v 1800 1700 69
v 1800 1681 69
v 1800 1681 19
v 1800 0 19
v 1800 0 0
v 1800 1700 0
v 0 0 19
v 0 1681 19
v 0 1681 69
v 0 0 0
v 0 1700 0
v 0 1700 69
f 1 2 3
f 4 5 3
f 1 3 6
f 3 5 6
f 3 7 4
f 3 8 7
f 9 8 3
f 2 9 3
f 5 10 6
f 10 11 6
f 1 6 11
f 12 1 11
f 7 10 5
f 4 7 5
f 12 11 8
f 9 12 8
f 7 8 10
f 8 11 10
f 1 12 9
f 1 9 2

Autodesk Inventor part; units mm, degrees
ref_plane "YZ Plane" through (0, 0, 0) normal (1, 0, 0) x (0, 1, 0)
ref_plane "XZ Plane" through (0, 0, 0) normal (0, 1, 0) x (-1, 0, 0)
ref_plane "XY Plane" through (0, 0, 0) normal (0, 0, 1) x (1, 0, 0)
sketch "Szkic1" plane through (0, 0, 0) normal (0, 0, 1) x (1, 0, 0)
  line L0 (0, 0) -> (1800, 0)
  line L1 (1800, 0) -> (1800, 1700)
  line L2 (1800, 1700) -> (0, 1700)
  line L3 (0, 1700) -> (0, 0)
  line L4 (0, 1681) -> (1800, 1681)
  dimension "d0" = 1800
  dimension "d1" = 1700
  dimension "d2" = 19
extrude "Wyciągnięcie proste1" add sketch "Szkic1" along normal blind 69 contours L3 L2 L1 L4
extrude "Wyciągnięcie proste2" add sketch "Szkic1" along normal blind 19 contours L3 L4 L1 L0
properties part number "blat" material "Drewno (klon)"
